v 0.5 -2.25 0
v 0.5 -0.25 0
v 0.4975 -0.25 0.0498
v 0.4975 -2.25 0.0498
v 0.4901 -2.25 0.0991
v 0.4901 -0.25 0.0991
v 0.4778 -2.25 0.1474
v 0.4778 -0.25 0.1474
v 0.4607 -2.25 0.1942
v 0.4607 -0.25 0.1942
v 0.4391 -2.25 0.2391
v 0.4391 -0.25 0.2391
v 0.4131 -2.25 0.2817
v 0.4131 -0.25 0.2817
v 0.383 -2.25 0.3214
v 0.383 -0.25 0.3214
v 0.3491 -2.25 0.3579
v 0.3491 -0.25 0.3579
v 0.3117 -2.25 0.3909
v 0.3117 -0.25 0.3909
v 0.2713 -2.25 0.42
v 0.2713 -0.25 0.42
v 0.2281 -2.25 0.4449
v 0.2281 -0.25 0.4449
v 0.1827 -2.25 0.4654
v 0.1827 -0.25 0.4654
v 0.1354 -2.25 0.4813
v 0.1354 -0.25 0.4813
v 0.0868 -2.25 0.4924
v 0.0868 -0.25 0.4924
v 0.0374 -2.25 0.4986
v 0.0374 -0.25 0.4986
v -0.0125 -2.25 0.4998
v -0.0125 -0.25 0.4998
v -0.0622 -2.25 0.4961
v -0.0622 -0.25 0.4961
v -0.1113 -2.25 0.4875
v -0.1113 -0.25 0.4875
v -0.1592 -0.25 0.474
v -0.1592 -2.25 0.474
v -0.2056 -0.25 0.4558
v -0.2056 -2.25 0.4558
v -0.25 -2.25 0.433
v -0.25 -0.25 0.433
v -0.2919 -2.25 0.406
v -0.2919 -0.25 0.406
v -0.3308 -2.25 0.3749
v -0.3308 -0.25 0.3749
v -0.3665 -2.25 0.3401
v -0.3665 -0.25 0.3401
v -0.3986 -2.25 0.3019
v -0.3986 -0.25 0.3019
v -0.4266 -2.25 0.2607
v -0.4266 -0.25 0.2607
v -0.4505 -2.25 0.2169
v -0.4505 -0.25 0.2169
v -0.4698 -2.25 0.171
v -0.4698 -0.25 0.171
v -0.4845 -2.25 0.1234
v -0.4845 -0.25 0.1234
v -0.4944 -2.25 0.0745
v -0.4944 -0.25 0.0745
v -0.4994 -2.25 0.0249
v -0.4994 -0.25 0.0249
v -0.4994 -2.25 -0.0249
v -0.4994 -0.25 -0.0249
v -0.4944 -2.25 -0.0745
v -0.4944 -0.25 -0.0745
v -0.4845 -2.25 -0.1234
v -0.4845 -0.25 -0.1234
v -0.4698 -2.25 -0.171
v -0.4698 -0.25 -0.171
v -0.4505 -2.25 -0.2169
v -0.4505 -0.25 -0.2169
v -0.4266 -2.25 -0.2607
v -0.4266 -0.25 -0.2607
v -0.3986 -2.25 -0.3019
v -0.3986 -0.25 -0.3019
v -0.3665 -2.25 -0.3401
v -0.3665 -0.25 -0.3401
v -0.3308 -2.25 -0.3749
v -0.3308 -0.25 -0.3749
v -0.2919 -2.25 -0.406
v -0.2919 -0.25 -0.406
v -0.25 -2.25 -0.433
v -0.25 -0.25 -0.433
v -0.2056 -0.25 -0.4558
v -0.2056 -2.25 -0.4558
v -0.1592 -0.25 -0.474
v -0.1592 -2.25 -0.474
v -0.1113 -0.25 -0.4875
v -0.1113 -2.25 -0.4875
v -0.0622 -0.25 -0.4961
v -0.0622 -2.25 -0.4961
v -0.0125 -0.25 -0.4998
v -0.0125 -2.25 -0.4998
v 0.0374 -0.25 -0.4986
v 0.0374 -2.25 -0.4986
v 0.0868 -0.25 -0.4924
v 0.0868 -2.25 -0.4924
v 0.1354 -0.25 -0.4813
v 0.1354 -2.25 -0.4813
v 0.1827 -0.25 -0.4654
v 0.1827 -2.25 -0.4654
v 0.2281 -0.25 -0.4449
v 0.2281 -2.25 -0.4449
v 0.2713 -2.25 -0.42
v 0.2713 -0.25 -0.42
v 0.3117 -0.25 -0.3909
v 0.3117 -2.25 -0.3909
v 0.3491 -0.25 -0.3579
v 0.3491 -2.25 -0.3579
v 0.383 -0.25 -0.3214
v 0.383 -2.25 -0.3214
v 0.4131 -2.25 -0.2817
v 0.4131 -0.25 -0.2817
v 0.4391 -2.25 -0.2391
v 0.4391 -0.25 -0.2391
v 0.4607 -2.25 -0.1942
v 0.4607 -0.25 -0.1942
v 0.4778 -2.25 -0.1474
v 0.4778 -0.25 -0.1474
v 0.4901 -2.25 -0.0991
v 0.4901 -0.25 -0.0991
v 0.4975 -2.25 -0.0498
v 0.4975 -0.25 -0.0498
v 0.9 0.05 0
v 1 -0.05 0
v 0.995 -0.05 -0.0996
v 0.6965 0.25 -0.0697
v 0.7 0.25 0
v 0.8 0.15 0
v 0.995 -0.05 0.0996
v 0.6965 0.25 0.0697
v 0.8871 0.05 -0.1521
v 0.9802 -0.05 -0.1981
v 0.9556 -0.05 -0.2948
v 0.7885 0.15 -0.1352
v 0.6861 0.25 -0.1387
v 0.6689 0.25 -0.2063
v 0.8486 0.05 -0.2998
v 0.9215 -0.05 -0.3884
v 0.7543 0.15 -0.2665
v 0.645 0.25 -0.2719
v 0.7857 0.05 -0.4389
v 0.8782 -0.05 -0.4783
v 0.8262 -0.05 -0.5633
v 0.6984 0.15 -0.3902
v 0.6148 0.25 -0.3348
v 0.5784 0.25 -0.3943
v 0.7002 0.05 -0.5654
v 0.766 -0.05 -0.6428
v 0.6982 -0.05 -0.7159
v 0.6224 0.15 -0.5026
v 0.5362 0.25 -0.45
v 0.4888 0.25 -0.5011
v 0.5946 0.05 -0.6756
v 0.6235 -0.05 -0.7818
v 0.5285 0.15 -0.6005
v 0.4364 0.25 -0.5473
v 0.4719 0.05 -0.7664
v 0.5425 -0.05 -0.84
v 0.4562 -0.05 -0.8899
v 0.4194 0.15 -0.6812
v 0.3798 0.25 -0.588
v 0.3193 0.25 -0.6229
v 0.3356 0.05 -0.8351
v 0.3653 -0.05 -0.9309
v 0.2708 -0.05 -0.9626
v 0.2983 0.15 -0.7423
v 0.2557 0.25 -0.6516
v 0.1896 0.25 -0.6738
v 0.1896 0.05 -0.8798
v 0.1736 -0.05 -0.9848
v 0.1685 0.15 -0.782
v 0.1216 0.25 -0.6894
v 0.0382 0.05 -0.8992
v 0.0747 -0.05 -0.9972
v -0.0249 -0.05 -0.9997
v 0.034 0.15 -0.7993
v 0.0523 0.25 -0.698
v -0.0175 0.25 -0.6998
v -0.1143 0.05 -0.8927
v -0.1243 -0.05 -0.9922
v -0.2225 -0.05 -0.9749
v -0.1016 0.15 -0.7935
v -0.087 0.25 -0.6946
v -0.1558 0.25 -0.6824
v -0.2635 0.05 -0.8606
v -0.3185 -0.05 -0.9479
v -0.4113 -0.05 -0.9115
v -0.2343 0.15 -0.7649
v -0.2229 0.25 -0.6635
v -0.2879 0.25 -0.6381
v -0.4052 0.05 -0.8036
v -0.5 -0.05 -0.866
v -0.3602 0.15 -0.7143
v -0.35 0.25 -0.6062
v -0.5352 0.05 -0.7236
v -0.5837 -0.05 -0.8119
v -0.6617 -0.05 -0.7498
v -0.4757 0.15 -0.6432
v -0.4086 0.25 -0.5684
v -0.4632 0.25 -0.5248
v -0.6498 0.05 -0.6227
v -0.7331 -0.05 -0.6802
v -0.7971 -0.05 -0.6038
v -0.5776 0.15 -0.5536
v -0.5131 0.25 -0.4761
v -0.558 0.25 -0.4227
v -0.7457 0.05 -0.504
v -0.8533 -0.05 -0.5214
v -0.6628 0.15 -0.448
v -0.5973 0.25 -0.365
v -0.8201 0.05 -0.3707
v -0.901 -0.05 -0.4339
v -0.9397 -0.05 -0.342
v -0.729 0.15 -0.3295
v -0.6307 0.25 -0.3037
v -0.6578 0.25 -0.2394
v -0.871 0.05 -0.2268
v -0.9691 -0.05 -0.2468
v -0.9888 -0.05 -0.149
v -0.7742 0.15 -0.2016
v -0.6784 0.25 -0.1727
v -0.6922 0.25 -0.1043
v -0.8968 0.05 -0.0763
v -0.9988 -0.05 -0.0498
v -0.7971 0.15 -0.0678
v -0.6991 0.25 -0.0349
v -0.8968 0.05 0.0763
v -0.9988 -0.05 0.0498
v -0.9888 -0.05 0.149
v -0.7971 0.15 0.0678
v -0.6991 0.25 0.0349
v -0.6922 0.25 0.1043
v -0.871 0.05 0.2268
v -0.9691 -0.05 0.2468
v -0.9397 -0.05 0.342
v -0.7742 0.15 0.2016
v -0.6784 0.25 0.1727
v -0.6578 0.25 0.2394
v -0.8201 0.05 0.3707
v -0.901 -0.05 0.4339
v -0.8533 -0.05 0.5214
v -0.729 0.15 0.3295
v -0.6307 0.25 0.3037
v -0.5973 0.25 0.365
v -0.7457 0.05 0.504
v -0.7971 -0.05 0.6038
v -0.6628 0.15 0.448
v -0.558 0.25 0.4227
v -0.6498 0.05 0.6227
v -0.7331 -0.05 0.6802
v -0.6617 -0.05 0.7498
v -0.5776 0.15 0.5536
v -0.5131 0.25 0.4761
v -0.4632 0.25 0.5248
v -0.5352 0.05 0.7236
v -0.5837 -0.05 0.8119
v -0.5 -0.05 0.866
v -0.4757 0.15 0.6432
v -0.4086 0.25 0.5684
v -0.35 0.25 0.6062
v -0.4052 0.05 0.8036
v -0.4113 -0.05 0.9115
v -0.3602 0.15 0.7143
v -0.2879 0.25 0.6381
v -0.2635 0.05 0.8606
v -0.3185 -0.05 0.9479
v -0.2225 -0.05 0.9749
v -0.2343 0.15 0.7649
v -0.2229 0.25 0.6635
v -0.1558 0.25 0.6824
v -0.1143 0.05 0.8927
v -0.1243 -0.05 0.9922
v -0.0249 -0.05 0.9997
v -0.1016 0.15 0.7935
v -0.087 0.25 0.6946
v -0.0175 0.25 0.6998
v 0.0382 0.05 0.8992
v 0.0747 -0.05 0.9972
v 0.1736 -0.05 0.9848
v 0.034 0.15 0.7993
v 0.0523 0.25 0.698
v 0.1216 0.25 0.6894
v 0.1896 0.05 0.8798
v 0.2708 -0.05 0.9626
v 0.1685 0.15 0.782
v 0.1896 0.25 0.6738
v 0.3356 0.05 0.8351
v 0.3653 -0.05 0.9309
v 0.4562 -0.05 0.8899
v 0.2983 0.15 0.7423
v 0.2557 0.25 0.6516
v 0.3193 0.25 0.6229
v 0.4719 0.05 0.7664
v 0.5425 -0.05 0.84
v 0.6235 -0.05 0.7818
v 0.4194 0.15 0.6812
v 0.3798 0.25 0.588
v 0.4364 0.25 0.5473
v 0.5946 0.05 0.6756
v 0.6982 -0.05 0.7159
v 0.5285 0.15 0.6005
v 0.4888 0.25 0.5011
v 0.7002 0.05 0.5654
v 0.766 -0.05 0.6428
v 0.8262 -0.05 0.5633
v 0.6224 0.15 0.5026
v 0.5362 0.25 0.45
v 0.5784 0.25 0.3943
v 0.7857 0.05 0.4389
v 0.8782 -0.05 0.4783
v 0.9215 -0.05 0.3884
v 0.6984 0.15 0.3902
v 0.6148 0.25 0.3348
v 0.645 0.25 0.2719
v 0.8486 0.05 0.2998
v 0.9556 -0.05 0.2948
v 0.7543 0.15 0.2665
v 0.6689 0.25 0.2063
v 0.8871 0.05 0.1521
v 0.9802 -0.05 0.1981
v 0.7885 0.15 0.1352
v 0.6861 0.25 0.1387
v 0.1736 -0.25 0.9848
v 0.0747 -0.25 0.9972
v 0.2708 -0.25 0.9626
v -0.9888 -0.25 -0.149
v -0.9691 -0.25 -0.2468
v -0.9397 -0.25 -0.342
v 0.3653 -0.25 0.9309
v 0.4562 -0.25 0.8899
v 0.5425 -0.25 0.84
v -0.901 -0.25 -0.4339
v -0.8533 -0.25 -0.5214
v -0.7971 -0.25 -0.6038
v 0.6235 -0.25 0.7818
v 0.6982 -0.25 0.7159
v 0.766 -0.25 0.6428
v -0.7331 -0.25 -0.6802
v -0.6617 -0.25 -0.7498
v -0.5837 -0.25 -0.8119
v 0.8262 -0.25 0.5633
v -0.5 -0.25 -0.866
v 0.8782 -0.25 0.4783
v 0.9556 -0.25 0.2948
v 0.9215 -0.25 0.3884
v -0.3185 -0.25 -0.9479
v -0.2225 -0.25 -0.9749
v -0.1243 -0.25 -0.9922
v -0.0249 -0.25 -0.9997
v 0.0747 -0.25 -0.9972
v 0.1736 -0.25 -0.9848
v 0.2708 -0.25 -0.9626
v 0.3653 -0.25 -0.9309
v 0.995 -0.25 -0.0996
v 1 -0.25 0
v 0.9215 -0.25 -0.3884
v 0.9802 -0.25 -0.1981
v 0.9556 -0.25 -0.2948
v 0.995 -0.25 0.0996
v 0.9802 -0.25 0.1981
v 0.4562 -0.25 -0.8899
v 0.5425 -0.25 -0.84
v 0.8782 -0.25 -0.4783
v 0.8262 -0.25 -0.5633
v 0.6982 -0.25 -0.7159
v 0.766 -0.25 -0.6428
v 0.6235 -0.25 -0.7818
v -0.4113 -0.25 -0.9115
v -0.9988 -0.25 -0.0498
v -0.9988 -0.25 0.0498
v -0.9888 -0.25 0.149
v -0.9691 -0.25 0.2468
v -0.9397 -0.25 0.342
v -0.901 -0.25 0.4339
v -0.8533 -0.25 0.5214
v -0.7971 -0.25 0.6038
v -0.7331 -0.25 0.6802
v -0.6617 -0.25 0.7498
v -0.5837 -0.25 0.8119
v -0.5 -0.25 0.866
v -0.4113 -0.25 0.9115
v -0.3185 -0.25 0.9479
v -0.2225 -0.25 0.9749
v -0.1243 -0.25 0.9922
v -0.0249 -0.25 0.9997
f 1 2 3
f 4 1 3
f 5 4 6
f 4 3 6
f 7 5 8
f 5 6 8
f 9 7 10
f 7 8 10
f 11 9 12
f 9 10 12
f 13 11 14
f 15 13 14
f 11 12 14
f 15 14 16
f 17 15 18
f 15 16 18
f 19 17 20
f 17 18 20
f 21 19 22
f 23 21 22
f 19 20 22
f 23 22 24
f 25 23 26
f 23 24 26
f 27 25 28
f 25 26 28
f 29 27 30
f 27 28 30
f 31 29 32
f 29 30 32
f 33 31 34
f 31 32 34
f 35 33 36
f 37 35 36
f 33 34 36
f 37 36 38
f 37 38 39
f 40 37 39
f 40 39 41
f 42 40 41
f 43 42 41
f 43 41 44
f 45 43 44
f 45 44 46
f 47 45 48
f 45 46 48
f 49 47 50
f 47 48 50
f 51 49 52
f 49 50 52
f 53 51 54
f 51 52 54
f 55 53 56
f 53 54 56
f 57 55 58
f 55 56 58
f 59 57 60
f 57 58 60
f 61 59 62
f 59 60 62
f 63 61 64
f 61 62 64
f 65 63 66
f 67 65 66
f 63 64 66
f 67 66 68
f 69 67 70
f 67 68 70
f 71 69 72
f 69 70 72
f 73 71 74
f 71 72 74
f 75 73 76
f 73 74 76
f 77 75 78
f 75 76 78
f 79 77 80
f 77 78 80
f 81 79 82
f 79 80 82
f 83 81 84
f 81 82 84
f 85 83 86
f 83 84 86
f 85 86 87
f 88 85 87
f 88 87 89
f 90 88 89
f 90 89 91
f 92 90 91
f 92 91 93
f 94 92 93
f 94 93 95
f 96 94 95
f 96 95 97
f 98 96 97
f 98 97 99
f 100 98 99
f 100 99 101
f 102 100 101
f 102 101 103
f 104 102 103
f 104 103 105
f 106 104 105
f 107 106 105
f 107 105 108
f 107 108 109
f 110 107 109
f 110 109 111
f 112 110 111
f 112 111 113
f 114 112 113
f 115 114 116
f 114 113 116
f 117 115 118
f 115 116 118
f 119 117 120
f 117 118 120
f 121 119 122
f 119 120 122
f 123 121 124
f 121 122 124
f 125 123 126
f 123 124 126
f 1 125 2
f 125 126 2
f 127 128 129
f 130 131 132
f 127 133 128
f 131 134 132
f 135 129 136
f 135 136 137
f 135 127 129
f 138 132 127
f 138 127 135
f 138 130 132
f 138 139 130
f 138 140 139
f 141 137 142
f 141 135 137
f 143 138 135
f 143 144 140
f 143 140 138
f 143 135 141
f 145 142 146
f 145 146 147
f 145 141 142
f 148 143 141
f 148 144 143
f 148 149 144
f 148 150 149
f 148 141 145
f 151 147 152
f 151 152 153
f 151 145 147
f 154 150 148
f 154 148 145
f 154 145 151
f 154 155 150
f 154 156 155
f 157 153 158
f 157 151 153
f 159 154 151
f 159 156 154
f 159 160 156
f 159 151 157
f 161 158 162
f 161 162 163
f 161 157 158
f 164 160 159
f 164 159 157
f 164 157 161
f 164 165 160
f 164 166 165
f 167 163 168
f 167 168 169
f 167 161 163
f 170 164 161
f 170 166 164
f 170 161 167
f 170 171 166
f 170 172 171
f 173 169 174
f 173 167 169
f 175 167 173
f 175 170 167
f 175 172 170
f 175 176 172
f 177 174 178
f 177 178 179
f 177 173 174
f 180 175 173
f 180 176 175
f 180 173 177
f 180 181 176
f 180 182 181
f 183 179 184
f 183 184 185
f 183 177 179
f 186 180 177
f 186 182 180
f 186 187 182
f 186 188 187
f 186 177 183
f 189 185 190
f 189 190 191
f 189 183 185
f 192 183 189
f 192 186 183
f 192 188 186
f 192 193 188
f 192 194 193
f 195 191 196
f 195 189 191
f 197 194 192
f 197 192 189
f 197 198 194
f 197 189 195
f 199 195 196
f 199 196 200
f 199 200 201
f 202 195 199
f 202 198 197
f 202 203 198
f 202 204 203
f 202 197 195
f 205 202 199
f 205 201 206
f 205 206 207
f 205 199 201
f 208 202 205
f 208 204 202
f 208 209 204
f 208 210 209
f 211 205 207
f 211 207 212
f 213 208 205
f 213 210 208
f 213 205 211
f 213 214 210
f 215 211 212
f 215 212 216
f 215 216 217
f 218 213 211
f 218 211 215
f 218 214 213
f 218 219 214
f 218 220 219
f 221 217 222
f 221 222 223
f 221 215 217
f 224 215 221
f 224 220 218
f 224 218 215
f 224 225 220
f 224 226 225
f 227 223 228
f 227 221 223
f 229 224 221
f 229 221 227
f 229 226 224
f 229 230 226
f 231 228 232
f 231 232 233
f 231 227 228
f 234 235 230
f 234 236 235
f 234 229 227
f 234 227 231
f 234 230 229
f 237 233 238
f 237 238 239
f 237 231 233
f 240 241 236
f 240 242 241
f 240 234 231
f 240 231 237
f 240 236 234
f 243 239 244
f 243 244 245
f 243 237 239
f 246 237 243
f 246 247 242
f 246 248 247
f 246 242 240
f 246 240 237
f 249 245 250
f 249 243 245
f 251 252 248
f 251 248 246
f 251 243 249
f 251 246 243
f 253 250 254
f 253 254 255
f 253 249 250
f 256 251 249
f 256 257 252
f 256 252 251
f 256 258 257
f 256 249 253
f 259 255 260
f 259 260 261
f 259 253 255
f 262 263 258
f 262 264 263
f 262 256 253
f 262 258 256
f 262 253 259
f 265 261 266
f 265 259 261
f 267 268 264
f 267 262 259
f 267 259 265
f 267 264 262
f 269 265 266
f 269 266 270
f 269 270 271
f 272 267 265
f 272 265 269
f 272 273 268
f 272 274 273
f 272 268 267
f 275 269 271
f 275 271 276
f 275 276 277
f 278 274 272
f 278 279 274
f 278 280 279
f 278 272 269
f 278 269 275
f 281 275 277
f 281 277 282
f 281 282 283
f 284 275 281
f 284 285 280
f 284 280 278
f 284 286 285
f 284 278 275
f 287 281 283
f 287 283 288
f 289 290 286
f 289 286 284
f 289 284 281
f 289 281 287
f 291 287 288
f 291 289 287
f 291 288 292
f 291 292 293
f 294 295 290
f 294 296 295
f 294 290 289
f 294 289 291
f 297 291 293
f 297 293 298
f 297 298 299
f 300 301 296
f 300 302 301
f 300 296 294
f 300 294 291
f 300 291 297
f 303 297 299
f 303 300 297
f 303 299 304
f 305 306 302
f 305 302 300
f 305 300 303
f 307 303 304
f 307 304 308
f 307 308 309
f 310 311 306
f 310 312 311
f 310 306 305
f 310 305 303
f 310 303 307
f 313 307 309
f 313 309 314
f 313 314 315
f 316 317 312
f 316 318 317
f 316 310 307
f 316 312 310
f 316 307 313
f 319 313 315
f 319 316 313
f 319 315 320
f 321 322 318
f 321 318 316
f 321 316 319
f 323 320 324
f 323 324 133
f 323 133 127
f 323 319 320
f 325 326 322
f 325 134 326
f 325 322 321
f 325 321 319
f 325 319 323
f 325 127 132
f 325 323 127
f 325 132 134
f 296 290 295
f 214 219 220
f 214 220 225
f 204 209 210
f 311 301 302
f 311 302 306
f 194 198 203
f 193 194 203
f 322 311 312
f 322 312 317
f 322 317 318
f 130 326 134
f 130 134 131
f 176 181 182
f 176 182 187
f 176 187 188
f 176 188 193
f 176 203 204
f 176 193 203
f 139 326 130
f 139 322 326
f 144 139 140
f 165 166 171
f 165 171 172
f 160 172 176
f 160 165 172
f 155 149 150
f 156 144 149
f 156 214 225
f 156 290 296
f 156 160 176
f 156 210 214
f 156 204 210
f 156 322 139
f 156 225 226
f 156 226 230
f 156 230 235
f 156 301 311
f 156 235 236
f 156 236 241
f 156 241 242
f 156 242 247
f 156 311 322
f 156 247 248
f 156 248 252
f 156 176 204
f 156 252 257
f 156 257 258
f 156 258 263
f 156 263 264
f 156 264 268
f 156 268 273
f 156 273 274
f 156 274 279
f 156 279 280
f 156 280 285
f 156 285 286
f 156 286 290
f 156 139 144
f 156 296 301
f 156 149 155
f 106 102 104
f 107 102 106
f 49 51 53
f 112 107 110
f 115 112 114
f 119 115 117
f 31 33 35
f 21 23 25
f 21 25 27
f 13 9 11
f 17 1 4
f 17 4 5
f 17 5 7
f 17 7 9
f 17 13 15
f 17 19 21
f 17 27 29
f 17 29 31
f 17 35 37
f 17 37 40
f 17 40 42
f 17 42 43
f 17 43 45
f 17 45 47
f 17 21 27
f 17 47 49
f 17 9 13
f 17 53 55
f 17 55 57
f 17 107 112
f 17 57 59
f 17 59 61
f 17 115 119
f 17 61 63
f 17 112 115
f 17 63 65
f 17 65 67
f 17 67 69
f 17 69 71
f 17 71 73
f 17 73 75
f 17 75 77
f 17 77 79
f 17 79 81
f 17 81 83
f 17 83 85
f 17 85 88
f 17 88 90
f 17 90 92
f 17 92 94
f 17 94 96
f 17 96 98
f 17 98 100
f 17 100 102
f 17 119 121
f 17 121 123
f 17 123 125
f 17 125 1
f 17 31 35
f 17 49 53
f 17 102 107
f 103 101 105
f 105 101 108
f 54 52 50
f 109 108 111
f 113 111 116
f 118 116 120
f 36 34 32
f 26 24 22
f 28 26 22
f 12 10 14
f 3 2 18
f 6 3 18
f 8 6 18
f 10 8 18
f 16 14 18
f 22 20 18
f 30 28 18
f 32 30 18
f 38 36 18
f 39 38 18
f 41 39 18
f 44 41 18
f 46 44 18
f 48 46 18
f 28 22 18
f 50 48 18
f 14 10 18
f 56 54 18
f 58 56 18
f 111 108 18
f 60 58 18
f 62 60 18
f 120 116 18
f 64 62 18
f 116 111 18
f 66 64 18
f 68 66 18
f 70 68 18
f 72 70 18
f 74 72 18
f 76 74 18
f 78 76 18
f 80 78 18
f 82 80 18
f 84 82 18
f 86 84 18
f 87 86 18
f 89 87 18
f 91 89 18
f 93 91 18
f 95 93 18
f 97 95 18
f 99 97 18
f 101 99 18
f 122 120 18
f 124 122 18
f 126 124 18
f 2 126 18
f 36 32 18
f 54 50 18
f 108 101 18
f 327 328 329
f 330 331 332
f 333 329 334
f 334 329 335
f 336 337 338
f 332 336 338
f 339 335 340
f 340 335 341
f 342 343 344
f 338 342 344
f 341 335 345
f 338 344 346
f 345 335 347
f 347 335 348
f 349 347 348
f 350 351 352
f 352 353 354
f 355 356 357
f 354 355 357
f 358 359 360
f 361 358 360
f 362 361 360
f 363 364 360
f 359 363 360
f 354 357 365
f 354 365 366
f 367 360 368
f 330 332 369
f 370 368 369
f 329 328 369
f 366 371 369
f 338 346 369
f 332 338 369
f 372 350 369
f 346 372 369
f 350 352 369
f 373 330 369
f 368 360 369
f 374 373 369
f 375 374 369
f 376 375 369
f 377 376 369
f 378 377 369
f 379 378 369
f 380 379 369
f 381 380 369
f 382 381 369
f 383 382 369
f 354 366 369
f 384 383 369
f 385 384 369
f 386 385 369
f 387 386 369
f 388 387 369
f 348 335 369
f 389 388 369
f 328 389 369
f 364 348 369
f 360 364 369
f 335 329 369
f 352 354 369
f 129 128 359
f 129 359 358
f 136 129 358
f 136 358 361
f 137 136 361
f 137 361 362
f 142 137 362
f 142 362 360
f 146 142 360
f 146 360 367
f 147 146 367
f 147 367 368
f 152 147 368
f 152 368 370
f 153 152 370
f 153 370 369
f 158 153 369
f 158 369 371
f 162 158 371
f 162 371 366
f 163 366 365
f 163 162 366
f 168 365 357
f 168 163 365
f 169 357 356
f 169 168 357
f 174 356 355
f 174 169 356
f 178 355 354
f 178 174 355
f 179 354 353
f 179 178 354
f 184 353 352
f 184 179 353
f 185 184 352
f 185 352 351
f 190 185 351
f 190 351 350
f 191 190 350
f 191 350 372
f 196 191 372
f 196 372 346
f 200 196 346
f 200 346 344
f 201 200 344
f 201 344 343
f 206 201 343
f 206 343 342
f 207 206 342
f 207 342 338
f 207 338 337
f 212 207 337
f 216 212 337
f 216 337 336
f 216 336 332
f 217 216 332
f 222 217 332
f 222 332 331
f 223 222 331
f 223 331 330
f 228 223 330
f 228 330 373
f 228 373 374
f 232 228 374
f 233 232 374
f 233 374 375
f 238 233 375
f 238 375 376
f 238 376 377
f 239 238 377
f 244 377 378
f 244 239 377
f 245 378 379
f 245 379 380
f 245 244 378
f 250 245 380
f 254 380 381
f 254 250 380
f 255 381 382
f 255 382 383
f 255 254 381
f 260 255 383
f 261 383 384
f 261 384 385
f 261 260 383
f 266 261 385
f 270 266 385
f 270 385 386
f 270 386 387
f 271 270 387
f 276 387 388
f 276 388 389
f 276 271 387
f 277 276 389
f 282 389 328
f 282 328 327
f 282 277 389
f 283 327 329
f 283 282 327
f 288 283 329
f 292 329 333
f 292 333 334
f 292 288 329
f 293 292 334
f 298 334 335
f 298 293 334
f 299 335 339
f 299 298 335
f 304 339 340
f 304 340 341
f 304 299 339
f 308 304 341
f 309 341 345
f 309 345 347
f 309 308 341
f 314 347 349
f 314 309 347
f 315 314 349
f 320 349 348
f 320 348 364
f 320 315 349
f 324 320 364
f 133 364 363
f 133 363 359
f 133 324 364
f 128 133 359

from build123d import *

# Parameters (mm, degrees)
SCHIZZO1_R                   = 1
ESTRUSIONE_ESTRUSIONE1_DEPTH = 0.25
SMUSSO1_SIZE                 = 0.3
SCHIZZO2_R                   = 0.5
ESTRUSIONE_ESTRUSIONE2_DEPTH = 2


with BuildPart() as part:
    # Schizzo1 → Estrusione-Estrusione1 (new body, symmetric)
    with BuildSketch(Plane(origin=(0, 0, 0), x_dir=(1, 0, 0), z_dir=(0, 1, 0))):
        Circle(SCHIZZO1_R)
    extrude(amount=ESTRUSIONE_ESTRUSIONE1_DEPTH, both=True)

    # Smusso1
    smusso1_edges = [part.edges().sort_by_distance(p)[0] for p in [
        (-1, 0.25, 0),
    ]]
    chamfer(smusso1_edges, length=SMUSSO1_SIZE)


with BuildPart() as body_2:
    # Schizzo2 → Estrusione-Estrusione2 (new body)
    with BuildSketch(Plane.XZ.offset(0.25)):
        Circle(SCHIZZO2_R)
    extrude(amount=ESTRUSIONE_ESTRUSIONE2_DEPTH)


solid = Compound([part.part, body_2.part])
